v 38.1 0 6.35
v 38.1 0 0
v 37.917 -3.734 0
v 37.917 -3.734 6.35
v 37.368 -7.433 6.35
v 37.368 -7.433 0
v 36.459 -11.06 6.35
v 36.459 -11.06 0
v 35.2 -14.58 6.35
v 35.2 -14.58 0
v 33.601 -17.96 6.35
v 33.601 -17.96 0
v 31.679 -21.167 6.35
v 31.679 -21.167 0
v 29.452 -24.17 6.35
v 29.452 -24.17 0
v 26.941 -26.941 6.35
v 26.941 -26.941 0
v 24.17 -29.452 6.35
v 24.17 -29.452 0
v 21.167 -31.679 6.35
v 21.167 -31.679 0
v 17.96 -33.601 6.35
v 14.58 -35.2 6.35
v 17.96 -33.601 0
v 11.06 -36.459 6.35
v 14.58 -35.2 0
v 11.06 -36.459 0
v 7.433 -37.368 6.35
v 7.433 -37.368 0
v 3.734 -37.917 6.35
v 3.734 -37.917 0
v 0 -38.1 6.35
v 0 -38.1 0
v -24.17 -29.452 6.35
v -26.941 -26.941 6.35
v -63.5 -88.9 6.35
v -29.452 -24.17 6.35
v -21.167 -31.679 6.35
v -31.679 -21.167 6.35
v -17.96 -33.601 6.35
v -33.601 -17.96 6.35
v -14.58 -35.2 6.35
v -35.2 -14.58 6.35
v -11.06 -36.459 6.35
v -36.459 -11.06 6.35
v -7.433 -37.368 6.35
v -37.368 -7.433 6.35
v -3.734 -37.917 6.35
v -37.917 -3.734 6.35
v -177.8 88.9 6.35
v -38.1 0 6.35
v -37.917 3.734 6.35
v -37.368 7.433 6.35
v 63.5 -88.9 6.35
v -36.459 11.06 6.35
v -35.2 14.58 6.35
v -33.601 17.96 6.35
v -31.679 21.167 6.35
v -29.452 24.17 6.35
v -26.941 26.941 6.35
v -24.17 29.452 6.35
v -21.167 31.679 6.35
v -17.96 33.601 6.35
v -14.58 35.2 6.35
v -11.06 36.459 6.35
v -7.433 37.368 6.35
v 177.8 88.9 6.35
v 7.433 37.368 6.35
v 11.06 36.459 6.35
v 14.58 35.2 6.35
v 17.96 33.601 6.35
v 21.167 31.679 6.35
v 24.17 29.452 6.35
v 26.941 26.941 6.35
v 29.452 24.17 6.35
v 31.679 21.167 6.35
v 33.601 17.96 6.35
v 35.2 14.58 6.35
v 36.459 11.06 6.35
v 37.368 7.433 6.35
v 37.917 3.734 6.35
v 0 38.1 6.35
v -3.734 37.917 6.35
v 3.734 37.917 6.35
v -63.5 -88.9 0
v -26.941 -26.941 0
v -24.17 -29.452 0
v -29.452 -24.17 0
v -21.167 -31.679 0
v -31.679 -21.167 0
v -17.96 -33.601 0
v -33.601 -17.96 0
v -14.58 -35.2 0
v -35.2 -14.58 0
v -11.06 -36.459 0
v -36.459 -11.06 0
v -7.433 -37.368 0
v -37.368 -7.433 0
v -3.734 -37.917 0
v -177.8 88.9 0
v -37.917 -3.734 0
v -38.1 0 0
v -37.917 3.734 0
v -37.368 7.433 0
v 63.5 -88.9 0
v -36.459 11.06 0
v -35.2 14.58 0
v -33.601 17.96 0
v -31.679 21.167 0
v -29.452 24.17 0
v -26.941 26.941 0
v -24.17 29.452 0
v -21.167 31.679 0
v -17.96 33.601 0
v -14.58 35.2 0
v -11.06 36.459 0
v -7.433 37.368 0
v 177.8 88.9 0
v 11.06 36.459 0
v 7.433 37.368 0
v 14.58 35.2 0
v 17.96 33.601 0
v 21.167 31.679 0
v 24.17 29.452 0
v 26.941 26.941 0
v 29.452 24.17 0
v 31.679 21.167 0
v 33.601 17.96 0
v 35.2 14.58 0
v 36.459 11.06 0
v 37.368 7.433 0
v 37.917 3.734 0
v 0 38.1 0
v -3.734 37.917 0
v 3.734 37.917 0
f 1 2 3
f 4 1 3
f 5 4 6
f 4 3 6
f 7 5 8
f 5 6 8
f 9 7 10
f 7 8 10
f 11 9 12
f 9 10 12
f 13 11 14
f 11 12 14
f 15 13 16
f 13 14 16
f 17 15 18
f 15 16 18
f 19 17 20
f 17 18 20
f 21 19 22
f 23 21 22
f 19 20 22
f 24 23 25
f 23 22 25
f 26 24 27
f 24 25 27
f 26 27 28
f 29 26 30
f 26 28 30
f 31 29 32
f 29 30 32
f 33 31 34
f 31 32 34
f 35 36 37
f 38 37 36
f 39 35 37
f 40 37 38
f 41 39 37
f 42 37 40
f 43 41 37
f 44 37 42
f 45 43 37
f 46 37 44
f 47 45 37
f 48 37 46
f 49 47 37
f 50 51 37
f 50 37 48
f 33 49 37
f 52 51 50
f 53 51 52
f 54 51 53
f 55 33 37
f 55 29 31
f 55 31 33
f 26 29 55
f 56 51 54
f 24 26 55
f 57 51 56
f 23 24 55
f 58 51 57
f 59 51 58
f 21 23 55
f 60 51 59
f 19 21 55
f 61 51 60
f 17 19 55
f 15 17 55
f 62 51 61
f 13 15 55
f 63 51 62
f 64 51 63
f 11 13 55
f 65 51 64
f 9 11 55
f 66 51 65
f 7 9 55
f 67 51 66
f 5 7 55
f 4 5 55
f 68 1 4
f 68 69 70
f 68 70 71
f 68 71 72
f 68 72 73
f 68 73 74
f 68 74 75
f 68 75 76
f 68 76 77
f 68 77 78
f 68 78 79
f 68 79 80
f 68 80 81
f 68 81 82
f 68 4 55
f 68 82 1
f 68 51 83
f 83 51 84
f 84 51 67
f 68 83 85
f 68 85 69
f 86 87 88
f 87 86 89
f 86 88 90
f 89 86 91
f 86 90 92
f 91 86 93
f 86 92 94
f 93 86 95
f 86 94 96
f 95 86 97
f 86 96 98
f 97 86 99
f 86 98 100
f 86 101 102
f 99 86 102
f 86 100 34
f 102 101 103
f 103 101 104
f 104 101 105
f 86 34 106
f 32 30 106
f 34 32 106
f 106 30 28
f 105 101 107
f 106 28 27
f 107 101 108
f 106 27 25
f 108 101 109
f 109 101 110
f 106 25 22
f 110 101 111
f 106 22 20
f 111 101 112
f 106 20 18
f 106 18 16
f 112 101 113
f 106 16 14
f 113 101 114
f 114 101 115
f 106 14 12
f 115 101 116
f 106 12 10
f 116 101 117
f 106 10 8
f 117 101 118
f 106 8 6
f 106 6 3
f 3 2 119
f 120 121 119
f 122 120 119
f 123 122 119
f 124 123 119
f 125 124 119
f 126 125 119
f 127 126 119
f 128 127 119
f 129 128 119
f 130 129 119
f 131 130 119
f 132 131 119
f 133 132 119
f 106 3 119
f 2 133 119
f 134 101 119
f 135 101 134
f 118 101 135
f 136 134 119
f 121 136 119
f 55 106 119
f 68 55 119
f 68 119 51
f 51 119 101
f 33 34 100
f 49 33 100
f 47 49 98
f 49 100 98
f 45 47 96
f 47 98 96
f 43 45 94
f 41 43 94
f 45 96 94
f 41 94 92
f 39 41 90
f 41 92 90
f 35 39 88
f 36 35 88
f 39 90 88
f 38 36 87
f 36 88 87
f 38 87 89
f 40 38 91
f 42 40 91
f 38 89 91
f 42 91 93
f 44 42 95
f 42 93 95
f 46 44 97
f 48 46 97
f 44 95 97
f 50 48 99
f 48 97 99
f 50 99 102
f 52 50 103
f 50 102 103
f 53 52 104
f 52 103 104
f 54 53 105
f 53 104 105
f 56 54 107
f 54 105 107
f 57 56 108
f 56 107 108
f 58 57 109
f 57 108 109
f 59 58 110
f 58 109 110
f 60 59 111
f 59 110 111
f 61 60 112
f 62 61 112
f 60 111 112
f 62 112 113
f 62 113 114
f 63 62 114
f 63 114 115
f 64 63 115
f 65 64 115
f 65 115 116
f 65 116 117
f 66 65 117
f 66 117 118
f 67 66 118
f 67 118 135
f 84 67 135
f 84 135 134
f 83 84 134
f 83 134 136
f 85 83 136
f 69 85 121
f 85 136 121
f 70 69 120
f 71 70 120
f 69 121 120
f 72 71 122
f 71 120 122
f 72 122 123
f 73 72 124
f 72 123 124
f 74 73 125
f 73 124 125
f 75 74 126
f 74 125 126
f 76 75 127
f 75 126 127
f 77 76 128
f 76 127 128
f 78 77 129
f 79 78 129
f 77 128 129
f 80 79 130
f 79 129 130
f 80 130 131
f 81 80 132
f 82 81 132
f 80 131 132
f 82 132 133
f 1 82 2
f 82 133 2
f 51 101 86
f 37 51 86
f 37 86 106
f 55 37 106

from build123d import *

# Parameters (mm, degrees)
F1_DEPTH = 6.35


with BuildPart() as f1:
    # F0 (on Top) → F1 (new body)
    with BuildSketch(Plane.XY):
        Polygon((-63.5, -88.9), (0, -88.9), (63.5, -88.9), (177.8, 88.9), (0, 88.9), (-177.8, 88.9), align=None)
        with BuildLine():
            ThreePointArc((0, -38.1), (-26.940768, 26.940768), (38.1, 0))
            ThreePointArc((38.1, 0), (26.940768, -26.940768), (0, -38.1))
        make_face(mode=Mode.SUBTRACT)
    extrude(amount=F1_DEPTH)


with BuildPart() as f2_1:
    # F2: copy of F1
    add(f1.part)


solid = f1.part
